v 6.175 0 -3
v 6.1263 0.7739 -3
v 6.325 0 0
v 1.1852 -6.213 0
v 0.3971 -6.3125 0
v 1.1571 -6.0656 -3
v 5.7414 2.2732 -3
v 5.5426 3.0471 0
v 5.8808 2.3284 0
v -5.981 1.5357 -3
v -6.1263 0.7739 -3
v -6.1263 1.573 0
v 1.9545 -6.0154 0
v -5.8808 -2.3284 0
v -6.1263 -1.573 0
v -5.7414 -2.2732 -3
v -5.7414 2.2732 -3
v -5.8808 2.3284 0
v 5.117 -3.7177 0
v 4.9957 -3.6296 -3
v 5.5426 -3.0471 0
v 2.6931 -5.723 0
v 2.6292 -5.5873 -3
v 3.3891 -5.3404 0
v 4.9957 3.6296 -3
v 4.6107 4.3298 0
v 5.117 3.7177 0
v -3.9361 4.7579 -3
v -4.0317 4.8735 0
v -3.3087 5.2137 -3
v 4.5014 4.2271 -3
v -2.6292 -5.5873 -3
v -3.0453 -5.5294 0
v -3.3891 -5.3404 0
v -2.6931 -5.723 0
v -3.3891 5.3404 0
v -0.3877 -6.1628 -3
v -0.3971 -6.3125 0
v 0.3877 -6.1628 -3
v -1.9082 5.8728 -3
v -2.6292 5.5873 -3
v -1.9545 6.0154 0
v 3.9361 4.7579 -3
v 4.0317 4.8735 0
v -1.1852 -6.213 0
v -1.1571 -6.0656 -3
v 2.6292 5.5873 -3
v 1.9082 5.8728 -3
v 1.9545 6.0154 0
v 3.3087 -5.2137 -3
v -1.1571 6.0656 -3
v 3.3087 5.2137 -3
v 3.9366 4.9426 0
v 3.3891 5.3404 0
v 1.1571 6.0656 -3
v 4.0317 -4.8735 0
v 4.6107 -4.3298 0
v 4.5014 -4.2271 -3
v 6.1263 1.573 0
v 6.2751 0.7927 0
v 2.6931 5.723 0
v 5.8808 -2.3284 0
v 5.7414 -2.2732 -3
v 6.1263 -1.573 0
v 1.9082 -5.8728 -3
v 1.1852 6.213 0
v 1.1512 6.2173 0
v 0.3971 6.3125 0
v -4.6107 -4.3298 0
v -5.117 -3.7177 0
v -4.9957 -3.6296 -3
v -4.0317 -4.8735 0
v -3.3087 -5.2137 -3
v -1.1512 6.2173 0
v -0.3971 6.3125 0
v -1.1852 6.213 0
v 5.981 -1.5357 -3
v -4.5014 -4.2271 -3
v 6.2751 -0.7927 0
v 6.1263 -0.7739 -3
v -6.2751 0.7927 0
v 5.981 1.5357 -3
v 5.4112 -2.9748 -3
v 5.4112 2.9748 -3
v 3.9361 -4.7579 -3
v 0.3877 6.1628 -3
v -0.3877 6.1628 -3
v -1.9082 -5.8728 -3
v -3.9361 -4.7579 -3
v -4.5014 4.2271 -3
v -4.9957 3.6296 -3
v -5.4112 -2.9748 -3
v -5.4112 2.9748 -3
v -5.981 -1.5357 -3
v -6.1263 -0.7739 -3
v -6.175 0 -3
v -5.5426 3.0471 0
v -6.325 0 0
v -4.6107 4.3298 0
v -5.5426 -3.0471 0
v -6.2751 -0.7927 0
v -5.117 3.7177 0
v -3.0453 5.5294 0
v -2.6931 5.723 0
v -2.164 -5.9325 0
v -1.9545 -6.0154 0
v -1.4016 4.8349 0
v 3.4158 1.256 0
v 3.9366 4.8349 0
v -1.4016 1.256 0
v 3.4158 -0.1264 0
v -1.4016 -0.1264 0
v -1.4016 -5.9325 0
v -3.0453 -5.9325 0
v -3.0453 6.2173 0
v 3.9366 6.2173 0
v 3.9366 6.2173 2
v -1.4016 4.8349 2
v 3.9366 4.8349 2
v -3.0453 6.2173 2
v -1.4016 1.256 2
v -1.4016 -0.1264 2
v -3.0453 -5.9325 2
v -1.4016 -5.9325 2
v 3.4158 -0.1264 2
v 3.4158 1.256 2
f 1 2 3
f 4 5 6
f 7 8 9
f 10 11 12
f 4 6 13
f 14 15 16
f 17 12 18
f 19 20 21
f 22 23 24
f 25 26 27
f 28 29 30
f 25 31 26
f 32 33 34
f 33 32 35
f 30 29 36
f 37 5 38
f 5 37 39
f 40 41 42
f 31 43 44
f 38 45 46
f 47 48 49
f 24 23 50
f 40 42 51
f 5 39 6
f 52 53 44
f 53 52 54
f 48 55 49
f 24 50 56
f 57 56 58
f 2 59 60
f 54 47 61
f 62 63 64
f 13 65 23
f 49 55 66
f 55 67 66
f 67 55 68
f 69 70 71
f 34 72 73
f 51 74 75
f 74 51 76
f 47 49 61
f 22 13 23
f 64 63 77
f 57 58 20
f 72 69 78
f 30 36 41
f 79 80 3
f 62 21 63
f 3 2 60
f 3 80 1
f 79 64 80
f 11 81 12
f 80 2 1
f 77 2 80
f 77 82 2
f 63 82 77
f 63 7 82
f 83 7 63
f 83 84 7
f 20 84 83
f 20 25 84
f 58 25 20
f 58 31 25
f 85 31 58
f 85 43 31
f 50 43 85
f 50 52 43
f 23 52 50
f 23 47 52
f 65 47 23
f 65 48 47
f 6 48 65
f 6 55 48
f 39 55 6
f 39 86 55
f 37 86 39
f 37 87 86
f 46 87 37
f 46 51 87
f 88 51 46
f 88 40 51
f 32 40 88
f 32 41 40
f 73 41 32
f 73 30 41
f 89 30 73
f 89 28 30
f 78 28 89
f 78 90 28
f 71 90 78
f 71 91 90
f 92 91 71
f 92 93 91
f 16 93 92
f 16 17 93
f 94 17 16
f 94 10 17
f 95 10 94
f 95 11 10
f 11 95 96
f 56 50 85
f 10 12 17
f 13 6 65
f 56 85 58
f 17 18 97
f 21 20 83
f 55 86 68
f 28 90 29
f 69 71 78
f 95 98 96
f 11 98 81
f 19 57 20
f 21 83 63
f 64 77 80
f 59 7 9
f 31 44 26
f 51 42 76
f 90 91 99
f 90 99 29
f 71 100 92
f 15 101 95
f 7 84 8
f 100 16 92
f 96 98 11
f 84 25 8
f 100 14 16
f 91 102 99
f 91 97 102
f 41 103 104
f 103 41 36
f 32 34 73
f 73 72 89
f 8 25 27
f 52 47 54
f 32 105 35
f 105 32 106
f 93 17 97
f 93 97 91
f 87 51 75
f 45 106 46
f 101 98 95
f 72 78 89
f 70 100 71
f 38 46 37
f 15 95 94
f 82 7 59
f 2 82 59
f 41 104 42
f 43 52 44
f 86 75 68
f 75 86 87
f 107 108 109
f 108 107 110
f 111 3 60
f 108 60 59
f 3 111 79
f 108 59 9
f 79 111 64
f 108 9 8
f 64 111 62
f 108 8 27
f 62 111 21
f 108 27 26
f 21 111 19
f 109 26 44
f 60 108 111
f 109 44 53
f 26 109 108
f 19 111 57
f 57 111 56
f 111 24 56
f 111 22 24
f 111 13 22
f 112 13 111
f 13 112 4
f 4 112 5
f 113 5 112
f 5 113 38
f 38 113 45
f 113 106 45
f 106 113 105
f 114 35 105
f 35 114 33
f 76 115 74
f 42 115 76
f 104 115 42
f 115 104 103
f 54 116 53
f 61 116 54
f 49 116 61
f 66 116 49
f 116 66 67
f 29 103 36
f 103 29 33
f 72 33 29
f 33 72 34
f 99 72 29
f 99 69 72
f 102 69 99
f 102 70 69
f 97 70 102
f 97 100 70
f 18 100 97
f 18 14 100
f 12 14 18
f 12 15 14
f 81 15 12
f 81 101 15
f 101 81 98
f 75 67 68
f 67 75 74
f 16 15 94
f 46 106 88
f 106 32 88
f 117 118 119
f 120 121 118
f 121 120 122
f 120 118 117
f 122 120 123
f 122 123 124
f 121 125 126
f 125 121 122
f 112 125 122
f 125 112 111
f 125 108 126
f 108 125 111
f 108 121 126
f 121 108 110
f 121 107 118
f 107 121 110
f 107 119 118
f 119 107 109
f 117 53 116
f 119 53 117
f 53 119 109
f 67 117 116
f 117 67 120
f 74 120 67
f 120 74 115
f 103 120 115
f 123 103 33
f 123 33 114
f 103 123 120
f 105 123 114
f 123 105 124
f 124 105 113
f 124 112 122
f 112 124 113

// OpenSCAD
$fn = 50;

difference() {
	union() {
		translate(v = [0, 0, -3.0]) {
			cylinder(h = 3, r1 = 6.175, r2 = 6.325);
		}
		linear_extrude(height = 2) {
			text(font = "Impact", halign = "center", size = 12, text = "F", valign = "center");
		}
	}
	union();
}
